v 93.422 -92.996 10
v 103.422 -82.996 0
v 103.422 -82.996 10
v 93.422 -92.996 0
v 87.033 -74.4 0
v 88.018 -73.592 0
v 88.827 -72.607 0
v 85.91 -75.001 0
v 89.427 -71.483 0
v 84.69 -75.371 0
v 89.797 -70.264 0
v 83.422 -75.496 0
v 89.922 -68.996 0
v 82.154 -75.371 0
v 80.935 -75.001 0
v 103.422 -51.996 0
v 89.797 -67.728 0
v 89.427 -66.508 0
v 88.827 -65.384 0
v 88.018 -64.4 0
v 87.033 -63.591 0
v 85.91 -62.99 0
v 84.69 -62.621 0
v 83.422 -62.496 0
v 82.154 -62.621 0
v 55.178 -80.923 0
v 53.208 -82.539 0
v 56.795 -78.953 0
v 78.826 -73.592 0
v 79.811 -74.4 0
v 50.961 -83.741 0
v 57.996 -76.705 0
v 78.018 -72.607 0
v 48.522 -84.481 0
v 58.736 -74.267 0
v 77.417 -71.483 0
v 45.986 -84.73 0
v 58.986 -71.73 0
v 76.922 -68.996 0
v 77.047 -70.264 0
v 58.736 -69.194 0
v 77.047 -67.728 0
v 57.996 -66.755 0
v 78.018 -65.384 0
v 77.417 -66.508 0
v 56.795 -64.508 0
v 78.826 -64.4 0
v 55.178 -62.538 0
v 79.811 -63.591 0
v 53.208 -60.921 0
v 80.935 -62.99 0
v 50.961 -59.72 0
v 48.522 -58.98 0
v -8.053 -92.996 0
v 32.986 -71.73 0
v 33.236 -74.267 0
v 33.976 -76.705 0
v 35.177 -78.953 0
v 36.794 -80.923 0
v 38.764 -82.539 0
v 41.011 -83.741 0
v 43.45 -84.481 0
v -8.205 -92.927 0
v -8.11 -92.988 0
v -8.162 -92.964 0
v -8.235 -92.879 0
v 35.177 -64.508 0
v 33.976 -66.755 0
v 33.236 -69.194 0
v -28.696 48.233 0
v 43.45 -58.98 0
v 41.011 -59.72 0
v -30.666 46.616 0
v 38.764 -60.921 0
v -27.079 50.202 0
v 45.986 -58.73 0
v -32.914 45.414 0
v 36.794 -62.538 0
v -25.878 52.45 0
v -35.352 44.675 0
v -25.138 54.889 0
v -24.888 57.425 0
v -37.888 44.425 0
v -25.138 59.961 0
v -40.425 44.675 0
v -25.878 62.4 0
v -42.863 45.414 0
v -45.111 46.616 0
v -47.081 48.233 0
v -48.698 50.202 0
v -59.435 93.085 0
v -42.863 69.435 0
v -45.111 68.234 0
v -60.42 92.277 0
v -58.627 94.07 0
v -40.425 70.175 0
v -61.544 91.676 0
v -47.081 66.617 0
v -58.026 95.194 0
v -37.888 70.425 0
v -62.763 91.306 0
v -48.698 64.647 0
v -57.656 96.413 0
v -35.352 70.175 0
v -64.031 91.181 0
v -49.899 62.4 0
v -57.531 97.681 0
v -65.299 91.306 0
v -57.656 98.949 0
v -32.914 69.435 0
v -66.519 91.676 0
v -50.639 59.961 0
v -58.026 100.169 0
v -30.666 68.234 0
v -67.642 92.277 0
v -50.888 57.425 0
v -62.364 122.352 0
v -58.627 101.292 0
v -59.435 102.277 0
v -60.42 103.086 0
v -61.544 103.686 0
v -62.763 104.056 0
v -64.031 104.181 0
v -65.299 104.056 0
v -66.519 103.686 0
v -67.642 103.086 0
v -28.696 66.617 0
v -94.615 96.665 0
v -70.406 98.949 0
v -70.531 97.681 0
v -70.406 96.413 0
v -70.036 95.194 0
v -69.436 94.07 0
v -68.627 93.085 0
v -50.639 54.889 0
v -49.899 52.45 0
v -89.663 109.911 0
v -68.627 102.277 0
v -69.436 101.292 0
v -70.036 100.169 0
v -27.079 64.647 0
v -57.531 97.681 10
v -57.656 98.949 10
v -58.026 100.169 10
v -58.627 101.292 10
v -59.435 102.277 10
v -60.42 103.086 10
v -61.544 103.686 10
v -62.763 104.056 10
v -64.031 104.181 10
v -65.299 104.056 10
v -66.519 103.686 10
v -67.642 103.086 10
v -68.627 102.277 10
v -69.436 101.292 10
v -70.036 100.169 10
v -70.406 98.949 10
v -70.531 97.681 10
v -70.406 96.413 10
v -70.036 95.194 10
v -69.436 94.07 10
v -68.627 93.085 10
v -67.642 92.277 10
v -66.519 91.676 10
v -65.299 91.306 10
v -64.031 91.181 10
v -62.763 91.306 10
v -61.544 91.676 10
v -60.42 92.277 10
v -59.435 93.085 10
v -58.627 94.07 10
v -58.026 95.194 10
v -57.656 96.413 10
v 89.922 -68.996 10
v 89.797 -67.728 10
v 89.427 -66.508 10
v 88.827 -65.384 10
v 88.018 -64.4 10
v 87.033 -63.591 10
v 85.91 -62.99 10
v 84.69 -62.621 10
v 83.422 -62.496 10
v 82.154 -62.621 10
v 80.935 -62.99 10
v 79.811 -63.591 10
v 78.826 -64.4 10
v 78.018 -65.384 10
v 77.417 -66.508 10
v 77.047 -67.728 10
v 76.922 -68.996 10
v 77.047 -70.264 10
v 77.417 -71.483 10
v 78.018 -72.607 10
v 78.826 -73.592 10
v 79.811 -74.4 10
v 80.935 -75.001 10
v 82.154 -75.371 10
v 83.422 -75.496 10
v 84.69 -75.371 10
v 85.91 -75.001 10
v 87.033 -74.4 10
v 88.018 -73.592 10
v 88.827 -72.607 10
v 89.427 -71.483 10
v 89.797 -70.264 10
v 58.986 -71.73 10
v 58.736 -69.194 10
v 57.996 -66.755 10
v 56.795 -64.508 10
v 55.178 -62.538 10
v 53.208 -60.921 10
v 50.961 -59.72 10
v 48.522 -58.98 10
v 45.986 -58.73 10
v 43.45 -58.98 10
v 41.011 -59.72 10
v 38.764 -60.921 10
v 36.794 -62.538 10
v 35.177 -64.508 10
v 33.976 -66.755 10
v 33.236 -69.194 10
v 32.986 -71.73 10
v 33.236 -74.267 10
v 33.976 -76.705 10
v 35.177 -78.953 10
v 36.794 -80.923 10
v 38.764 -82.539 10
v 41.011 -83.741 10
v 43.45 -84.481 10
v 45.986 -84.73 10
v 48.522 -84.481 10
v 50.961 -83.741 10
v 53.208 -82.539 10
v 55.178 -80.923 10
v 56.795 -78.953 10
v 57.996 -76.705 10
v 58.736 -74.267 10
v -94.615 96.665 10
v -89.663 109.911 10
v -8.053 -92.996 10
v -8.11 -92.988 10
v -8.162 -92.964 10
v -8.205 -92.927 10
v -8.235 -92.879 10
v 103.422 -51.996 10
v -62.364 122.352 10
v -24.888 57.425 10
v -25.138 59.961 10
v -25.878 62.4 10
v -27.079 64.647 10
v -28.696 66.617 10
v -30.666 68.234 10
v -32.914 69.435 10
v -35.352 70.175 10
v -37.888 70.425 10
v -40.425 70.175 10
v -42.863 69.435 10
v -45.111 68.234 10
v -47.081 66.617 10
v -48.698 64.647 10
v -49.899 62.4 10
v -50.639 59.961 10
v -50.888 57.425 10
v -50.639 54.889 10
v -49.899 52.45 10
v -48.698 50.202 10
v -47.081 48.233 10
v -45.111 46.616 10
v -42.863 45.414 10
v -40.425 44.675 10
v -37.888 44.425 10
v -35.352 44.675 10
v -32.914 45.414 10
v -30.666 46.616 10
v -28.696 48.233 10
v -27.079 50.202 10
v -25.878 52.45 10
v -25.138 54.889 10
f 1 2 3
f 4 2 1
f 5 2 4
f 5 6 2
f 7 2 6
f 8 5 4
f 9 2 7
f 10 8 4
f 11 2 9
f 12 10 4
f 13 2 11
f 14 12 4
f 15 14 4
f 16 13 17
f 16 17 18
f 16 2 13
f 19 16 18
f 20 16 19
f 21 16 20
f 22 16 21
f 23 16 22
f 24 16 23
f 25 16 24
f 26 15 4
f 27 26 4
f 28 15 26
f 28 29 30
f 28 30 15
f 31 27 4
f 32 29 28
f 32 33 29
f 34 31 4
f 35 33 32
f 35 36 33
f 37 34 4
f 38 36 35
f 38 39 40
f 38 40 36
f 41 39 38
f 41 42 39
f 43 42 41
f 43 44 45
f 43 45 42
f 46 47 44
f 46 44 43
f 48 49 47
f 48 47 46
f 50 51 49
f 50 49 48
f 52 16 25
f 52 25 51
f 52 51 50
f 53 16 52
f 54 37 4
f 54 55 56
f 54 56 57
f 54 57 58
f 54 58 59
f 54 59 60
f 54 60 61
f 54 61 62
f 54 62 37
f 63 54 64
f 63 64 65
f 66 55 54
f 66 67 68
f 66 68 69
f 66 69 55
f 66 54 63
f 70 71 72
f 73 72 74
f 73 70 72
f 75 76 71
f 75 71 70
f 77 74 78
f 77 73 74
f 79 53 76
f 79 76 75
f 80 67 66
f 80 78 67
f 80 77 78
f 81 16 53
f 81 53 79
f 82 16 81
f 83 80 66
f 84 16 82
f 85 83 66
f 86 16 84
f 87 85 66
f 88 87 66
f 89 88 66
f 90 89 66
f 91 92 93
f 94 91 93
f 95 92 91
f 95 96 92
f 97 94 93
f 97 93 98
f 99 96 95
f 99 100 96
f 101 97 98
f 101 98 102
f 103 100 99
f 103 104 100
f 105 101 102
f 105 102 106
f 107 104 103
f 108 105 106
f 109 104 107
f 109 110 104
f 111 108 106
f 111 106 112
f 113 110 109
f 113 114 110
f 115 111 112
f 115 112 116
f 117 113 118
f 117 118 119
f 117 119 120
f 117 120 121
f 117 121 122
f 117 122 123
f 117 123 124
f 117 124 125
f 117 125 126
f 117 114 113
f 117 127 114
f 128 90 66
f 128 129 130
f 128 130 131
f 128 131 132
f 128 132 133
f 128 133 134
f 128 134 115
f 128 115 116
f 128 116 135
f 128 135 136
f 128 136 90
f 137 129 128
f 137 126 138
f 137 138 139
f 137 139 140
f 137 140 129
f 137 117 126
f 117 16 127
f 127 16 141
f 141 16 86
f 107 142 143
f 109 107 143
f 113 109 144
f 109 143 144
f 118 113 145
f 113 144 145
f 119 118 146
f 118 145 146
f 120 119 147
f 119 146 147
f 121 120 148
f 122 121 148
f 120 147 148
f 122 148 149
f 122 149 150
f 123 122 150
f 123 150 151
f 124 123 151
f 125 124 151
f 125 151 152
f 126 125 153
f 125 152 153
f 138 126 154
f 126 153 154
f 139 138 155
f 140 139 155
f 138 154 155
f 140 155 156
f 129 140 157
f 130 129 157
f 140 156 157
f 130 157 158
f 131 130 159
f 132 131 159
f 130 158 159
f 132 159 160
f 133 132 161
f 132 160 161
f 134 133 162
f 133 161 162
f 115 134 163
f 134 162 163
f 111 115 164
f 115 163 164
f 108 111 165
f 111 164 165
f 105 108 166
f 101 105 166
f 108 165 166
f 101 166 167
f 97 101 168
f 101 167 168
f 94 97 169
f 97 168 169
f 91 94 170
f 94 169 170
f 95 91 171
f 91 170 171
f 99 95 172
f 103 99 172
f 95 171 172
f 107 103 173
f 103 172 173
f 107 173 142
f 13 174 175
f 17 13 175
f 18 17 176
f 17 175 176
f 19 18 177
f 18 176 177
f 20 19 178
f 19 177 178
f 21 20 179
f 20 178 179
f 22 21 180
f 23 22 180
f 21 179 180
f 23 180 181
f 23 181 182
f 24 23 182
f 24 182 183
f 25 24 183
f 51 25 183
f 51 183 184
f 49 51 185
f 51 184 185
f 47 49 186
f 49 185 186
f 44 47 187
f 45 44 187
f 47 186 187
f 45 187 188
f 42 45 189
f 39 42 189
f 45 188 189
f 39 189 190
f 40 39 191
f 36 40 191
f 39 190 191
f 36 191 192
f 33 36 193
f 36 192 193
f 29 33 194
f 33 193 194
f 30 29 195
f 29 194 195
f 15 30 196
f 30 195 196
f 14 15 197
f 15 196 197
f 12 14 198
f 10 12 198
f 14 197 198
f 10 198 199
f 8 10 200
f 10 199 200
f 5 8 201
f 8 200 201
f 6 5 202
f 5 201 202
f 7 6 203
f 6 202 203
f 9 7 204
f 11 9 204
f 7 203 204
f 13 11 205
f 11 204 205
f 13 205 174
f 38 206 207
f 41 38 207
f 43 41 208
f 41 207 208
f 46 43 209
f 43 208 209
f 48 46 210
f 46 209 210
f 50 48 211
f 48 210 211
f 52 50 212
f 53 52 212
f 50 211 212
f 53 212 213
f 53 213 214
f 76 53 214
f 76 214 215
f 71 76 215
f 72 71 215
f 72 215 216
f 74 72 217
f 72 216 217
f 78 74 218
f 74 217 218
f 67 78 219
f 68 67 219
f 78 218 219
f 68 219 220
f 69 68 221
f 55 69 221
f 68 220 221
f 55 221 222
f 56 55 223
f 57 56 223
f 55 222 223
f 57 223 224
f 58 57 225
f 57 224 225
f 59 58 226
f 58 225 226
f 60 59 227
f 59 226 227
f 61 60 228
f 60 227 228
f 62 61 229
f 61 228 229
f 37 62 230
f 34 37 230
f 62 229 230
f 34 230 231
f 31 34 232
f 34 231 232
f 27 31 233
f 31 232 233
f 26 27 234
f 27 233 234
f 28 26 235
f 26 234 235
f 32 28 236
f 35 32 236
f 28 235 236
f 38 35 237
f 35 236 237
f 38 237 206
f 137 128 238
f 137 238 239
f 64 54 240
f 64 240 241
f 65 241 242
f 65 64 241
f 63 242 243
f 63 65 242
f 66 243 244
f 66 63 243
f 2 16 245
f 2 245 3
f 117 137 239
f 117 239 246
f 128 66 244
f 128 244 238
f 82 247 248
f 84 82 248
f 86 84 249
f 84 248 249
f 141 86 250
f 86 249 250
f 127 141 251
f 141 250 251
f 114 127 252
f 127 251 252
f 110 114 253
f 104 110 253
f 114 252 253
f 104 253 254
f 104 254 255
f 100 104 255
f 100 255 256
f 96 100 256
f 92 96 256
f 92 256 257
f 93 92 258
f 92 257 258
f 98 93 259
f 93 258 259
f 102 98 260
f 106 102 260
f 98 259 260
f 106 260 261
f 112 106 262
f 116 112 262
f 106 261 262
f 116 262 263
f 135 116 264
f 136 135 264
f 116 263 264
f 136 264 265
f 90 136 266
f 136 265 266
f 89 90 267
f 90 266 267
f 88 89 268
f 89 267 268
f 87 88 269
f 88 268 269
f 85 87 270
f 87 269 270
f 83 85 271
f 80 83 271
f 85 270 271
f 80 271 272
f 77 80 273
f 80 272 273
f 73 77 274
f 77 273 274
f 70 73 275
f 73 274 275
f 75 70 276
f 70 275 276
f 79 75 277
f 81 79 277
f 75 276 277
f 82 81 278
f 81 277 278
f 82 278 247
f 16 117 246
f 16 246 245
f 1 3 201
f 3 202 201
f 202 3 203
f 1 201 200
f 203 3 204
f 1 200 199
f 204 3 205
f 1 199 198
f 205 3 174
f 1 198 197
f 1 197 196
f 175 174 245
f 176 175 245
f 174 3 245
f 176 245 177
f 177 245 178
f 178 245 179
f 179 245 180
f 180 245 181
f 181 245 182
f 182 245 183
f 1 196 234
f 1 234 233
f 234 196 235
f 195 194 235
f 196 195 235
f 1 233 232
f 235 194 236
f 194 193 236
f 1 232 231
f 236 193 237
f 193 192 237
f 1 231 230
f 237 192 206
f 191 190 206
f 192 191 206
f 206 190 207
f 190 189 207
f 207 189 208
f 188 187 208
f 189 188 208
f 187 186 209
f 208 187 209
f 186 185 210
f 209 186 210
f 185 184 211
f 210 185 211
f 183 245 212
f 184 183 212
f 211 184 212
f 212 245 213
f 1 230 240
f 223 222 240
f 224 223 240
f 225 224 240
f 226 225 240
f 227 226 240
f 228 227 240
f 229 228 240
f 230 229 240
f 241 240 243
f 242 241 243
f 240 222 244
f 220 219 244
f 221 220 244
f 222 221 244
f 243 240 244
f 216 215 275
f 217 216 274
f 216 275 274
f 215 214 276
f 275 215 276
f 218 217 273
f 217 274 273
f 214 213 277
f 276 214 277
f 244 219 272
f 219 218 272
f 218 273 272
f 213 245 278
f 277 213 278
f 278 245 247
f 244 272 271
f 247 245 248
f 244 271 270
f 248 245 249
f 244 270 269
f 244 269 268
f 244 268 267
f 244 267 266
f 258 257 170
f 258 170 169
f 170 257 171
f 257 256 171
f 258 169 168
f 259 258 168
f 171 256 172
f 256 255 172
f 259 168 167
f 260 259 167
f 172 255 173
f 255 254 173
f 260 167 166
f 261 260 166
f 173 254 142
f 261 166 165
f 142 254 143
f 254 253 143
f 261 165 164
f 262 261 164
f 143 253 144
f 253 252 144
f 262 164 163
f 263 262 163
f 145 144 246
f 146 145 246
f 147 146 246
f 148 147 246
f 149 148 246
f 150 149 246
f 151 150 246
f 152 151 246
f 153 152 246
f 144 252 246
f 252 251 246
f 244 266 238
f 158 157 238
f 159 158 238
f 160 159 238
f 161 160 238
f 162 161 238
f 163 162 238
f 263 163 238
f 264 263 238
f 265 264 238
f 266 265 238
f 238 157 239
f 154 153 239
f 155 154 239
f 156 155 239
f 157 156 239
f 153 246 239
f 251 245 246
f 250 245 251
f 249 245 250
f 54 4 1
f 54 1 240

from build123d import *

# Parameters (mm, degrees)
BOSS_EXTRUDE1_DEPTH = 10
SKETCH2_R           = 6.5
SKETCH2_R_2         = 13
CUT_EXTRUDE1_DEPTH  = 10


with BuildPart() as part:
    # Sketch1 → Boss-Extrude1 (new body)
    with BuildSketch(Plane.XY):
        with BuildLine():
            Line((103.422242509, -51.995703566), (103.422242509, -82.995703566))
            Line((103.422242509, -82.995703566), (93.422242509, -92.995703566))
            Line((93.422242509, -92.995703566), (-8.05332169, -92.995703566))
            ThreePointArc((-8.05332169, -92.995703566), (-8.161516585, -92.963911368), (-8.235313944, -92.878642214))
            Line((-8.235313944, -92.878642214), (-94.615281586, 96.66489756))
            Line((-94.615281586, 96.66489756), (-89.662601304, 109.911442695))
            Line((-89.662601304, 109.911442695), (-62.363763178, 122.352239975))
            Line((-62.363763178, 122.352239975), (103.422242509, -51.995703566))
        make_face()
    extrude(amount=BOSS_EXTRUDE1_DEPTH)

    # Sketch2 → Cut-Extrude1 (cut)
    with BuildSketch(Plane.XY.offset(10)):
        with Locations((83.422242509, -68.995703566)):
            Circle(SKETCH2_R)
        with Locations((-64.03112347, 97.68108884)):
            Circle(SKETCH2_R)
        with Locations((-37.88844979, 57.424901579)):
            Circle(SKETCH2_R_2)
        with Locations((45.985961603, -71.730365885)):
            Circle(SKETCH2_R_2)
    extrude(amount=-CUT_EXTRUDE1_DEPTH, mode=Mode.SUBTRACT)


solid = part.part
